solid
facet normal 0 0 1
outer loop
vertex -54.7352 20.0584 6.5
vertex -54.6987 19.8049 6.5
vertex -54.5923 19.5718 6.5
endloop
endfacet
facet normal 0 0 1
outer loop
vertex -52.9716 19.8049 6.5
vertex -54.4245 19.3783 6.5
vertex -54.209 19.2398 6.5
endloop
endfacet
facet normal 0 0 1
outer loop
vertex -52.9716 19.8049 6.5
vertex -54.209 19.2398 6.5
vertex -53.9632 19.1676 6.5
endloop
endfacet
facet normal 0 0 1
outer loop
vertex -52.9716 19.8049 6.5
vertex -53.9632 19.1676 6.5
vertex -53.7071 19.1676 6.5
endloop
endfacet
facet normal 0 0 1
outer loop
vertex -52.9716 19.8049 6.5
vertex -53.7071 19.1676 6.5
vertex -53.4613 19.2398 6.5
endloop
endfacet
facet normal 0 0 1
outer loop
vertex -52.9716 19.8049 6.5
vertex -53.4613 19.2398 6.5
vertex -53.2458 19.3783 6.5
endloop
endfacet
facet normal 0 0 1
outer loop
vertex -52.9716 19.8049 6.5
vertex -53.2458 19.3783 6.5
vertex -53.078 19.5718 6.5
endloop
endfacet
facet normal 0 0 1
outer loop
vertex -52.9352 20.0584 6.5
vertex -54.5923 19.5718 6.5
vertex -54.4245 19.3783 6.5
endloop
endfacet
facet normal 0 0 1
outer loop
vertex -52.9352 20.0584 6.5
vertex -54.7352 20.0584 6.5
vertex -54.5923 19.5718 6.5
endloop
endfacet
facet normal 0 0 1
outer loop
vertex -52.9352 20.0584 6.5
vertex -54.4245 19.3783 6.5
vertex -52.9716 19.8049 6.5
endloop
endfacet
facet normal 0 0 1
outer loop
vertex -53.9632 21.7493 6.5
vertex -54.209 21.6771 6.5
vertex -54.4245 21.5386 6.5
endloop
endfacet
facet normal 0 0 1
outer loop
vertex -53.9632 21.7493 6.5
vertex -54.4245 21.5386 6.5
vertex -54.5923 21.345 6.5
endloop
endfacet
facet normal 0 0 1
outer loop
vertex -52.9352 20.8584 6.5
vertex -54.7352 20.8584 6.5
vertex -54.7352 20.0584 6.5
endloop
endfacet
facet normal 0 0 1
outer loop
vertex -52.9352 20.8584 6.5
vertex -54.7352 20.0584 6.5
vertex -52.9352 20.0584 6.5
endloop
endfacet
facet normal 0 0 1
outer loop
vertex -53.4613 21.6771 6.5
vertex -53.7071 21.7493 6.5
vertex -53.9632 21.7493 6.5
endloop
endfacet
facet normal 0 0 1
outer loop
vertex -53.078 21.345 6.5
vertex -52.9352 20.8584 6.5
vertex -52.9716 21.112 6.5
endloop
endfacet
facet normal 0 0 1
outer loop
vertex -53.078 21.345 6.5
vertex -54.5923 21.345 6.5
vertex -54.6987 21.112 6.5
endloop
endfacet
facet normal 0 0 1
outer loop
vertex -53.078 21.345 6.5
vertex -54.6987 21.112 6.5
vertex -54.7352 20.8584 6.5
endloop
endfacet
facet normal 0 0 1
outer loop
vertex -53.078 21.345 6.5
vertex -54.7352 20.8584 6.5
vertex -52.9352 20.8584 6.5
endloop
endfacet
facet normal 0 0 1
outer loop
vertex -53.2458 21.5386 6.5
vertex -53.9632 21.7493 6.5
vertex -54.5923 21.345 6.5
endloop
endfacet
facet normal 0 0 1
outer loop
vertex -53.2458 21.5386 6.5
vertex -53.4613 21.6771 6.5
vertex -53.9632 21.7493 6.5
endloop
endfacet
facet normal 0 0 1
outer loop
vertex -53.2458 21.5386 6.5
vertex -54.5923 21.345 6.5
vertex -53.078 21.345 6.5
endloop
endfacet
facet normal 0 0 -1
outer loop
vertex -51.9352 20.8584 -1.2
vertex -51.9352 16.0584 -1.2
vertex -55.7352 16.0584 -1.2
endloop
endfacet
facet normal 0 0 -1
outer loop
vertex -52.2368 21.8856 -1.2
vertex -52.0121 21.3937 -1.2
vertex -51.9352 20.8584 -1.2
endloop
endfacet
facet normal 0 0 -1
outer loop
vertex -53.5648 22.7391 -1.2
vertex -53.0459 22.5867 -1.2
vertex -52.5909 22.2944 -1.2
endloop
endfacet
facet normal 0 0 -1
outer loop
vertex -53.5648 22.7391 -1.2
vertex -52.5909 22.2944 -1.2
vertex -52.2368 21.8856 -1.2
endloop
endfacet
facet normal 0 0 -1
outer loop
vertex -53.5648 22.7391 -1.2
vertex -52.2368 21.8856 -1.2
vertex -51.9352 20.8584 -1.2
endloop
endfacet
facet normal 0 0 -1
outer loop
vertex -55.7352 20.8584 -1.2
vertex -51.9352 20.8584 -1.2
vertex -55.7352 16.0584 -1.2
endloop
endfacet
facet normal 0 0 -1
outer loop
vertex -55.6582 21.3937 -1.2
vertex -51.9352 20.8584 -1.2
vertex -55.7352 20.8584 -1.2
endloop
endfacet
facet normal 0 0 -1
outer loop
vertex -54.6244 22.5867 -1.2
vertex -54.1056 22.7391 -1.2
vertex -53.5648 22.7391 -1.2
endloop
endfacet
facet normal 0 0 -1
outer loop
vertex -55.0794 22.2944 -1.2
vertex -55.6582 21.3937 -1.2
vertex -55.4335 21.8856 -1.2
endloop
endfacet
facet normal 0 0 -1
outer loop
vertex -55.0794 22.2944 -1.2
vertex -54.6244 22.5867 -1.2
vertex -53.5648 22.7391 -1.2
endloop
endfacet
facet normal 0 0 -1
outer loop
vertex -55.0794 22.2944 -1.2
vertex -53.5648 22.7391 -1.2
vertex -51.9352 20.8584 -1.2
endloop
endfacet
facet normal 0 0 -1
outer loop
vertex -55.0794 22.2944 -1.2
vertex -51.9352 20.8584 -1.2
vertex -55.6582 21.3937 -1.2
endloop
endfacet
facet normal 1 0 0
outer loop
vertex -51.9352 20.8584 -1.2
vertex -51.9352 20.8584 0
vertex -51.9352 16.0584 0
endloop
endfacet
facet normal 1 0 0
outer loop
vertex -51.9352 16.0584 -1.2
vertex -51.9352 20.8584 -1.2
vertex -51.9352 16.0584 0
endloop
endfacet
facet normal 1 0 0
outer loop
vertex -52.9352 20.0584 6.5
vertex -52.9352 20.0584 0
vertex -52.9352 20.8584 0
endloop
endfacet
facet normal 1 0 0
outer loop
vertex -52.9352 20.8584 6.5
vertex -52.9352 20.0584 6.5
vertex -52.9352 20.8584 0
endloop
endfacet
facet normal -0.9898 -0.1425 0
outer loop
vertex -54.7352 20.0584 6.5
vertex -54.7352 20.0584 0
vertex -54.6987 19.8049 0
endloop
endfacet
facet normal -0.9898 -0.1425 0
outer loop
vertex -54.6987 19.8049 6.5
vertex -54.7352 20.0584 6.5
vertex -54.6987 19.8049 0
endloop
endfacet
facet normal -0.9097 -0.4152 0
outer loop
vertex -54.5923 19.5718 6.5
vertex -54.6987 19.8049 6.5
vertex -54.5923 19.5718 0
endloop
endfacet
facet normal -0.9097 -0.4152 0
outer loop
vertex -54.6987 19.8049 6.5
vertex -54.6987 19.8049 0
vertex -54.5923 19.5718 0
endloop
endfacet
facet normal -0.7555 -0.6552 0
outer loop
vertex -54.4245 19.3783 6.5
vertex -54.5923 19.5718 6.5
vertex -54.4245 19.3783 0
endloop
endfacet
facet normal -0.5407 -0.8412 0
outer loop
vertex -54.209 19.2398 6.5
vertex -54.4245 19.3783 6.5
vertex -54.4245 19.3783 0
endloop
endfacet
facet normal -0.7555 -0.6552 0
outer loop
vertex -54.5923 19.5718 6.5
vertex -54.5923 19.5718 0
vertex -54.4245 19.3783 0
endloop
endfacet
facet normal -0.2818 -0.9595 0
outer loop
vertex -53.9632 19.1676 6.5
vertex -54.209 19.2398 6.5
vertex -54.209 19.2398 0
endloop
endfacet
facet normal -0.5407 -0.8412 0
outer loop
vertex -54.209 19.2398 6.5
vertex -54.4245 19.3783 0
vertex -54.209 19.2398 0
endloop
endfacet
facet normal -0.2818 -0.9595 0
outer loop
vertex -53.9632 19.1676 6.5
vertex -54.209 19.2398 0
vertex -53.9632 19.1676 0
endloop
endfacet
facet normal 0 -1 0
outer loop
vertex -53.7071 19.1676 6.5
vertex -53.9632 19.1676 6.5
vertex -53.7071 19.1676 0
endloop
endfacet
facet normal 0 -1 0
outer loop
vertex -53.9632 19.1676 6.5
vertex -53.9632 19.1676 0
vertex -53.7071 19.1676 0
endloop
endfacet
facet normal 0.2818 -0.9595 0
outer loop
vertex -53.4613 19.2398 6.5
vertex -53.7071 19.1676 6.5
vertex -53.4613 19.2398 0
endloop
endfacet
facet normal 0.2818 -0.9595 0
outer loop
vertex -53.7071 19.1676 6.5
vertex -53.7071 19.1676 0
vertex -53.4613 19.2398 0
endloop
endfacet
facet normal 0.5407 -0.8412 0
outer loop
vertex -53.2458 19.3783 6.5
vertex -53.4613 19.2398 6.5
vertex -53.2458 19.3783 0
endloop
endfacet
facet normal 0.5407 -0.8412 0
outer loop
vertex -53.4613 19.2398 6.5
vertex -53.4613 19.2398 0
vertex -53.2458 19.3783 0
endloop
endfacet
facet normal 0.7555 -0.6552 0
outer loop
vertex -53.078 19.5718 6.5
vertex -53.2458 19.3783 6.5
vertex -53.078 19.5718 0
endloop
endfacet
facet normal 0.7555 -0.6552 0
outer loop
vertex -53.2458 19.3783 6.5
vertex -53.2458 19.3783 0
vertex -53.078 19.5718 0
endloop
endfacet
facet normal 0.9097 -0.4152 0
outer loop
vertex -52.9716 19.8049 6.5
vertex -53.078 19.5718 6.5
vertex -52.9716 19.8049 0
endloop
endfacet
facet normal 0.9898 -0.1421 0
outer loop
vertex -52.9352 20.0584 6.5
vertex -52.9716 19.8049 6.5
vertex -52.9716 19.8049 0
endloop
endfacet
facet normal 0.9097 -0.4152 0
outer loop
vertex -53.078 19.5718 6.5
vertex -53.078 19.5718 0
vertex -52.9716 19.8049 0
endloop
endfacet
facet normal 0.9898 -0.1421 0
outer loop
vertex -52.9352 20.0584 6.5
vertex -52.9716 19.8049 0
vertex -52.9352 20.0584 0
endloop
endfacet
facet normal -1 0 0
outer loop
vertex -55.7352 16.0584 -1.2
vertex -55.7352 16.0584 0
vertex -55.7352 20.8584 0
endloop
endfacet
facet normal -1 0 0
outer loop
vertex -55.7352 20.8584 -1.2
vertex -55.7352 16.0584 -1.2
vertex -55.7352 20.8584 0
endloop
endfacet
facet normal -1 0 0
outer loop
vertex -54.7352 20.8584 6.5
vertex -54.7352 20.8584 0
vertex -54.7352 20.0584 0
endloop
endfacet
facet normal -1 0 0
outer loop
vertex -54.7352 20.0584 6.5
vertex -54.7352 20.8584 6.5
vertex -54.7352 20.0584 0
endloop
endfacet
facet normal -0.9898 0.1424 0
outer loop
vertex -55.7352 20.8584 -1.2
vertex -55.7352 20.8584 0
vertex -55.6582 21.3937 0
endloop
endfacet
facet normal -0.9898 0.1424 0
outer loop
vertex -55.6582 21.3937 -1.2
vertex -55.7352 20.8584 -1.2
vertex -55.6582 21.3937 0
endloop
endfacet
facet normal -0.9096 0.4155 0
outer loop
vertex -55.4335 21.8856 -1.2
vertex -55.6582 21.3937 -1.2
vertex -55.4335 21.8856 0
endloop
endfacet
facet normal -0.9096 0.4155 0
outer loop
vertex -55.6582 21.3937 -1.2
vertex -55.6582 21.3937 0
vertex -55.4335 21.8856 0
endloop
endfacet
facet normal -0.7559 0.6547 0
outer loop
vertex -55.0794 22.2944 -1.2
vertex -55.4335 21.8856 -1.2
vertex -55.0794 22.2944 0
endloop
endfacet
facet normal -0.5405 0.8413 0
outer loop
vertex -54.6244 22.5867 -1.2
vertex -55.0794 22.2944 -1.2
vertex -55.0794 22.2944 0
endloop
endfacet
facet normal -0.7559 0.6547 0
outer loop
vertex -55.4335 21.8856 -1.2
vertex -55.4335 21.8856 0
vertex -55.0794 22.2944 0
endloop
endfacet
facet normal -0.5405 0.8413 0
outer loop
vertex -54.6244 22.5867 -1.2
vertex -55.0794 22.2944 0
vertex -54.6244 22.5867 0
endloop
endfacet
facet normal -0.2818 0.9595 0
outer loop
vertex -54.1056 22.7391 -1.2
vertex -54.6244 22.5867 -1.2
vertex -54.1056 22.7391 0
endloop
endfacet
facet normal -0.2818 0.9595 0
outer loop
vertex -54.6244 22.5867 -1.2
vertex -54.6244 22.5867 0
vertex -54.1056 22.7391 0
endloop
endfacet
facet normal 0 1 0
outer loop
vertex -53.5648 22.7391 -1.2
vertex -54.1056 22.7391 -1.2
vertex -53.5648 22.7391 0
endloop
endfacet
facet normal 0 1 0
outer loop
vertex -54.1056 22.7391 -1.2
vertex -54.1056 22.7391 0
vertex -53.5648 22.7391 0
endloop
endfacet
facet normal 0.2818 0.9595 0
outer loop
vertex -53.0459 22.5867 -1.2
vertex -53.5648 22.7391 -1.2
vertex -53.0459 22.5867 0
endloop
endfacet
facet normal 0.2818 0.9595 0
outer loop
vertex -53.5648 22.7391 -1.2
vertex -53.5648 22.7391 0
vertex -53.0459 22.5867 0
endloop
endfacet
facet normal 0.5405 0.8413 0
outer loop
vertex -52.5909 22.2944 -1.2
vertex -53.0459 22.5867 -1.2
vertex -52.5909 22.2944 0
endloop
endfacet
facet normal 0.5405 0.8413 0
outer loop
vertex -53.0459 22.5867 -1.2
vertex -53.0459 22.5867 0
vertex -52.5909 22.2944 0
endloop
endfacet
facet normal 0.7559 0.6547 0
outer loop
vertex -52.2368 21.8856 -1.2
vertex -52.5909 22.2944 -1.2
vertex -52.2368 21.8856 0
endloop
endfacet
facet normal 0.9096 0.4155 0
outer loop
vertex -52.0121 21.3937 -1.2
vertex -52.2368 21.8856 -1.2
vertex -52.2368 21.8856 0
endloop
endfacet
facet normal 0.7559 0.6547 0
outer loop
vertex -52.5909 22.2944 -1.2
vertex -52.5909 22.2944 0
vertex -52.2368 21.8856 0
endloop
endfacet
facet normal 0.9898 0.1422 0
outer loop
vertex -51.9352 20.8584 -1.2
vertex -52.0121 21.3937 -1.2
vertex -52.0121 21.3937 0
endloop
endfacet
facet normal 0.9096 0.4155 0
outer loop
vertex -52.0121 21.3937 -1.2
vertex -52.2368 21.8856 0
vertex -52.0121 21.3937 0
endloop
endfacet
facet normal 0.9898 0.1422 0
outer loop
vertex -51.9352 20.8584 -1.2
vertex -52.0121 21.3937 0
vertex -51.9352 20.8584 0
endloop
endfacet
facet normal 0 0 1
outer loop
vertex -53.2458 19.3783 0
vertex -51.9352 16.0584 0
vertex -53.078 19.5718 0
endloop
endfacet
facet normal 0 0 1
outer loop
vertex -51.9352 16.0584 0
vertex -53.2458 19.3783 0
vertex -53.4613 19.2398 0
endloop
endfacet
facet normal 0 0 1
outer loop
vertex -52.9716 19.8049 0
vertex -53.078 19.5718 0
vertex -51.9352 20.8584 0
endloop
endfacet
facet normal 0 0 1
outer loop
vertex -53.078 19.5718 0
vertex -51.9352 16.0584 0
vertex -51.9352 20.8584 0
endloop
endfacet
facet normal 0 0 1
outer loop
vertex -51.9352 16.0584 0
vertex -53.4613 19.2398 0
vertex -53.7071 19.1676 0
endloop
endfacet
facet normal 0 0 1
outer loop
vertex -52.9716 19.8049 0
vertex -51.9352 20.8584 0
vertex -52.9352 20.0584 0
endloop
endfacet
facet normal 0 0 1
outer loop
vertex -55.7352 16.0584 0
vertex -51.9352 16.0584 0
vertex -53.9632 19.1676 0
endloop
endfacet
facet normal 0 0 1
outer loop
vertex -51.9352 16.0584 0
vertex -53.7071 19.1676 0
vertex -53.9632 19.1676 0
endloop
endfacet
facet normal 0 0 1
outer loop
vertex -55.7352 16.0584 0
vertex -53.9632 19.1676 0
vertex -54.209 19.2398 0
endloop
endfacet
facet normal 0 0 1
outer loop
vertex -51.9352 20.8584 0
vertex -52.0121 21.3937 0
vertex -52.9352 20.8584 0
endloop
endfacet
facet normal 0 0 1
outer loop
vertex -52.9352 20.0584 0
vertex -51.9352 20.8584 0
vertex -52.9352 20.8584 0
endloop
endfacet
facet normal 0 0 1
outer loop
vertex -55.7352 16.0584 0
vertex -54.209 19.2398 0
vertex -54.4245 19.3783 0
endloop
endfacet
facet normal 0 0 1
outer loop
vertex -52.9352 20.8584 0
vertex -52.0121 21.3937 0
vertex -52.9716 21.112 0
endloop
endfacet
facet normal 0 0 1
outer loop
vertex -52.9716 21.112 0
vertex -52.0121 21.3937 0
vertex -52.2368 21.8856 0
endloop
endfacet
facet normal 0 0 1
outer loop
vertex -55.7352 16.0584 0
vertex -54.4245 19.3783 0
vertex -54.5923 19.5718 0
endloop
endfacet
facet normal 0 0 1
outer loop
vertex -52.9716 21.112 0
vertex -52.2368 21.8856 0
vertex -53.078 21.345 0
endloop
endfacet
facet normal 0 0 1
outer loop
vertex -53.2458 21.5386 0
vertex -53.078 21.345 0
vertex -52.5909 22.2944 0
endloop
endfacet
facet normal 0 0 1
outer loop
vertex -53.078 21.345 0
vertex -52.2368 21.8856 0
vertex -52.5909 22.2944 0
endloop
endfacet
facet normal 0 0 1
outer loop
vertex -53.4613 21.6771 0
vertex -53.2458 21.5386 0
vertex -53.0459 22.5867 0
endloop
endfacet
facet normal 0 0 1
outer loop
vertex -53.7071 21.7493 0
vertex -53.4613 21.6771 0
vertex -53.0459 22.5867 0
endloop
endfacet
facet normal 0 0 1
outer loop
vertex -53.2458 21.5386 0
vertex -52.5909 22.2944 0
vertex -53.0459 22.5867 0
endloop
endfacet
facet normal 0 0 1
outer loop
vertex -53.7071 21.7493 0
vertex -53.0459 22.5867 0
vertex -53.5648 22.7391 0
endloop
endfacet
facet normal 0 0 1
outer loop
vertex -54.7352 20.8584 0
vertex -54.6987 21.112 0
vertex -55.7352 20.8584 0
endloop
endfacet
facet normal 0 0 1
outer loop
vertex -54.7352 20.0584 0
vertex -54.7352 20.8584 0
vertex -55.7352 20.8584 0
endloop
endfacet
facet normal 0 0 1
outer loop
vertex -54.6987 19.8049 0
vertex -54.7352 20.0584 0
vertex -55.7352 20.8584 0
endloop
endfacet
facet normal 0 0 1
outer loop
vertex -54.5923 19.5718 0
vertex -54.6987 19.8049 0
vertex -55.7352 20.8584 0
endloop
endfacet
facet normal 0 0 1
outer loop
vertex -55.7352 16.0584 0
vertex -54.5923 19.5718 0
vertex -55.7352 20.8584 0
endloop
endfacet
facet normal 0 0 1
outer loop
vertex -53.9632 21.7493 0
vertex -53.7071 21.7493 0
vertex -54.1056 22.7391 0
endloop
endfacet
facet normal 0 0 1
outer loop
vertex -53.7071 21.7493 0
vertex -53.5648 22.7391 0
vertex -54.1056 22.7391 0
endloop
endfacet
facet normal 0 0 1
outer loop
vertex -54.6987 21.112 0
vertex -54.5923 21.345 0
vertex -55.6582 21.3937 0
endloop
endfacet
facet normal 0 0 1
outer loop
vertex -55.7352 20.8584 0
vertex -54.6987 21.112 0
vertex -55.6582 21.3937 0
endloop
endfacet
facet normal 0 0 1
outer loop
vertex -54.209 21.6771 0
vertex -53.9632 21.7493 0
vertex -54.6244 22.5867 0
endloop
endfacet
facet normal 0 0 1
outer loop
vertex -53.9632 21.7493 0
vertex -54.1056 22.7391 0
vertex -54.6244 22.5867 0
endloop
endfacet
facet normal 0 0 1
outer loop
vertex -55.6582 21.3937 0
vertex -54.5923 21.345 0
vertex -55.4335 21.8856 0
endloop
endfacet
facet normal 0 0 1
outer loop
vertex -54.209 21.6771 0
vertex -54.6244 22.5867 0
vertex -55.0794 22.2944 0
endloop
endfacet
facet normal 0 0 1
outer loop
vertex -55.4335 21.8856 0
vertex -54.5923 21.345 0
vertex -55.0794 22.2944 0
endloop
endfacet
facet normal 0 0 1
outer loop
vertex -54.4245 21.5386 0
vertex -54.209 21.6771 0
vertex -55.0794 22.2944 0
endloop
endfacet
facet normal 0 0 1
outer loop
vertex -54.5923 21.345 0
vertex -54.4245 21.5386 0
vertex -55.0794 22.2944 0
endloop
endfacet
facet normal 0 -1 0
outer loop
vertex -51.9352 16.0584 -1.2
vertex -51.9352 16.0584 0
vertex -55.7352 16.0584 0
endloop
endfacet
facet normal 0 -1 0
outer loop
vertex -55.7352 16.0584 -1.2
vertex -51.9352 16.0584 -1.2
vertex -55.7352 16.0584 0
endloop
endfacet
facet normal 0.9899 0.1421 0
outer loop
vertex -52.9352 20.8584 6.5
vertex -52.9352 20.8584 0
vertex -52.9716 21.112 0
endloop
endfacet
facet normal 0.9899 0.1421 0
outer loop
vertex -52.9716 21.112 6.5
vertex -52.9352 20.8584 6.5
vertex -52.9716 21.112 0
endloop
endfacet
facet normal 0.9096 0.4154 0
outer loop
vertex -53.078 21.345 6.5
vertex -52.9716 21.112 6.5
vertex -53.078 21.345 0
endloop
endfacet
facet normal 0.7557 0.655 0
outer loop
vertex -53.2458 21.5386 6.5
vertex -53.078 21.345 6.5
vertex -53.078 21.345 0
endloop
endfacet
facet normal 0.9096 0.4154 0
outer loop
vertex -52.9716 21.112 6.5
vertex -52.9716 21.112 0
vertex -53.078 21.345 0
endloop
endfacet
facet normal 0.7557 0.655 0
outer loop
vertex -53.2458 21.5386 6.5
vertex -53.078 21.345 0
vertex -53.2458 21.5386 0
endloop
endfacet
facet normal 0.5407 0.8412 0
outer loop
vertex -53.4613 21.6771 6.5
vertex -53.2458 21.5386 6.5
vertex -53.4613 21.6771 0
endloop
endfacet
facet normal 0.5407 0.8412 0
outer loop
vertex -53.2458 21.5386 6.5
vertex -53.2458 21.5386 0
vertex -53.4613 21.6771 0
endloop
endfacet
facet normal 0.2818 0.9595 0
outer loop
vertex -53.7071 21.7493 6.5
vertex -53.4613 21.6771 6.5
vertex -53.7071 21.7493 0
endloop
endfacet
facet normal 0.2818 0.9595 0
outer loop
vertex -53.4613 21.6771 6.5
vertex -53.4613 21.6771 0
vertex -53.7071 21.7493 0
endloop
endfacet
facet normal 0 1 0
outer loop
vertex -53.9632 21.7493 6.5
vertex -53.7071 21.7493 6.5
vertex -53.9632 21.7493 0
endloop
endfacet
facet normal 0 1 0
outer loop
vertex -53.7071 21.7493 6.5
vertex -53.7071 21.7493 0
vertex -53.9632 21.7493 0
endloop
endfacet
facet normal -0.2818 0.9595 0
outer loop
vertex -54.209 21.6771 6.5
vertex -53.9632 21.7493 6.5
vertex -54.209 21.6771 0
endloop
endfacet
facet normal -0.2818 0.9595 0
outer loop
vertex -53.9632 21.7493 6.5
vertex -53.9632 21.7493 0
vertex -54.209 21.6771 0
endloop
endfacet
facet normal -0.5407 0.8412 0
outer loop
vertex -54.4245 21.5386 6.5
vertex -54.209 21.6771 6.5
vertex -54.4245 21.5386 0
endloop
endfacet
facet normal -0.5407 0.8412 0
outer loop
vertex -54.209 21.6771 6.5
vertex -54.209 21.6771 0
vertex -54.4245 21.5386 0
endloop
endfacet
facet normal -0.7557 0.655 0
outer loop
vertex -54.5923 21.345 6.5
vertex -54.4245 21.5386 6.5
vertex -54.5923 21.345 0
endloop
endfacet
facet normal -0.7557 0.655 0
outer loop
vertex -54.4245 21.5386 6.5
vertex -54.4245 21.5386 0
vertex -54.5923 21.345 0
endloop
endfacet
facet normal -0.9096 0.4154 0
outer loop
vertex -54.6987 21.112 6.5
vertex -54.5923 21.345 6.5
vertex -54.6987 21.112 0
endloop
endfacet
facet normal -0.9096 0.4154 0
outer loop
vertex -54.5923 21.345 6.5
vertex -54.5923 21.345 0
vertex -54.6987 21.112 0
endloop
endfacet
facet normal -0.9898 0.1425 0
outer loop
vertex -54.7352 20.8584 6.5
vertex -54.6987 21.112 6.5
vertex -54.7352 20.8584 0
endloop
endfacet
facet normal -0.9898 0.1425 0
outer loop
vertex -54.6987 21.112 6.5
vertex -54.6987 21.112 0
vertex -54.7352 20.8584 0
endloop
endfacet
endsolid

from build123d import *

# Parameters (mm, degrees)
BOSS_EXTRUDE1_DEPTH = 6.5
BOSS_EXTRUDE2_DEPTH = 1.2


with BuildPart() as part:
    # Sketch1 → Boss-Extrude1 (new body)
    with BuildSketch(Plane.XY):
        with BuildLine():
            Line((-54.735153148, 20.85842627), (-54.735153148, 20.05842627))
            ThreePointArc((-54.735153148, 20.05842627), (-53.835153148, 19.15842627), (-52.935153148, 20.05842627))
            Line((-52.935153148, 20.05842627), (-52.935153148, 20.85842627))
            ThreePointArc((-52.935153148, 20.85842627), (-53.835153148, 21.75842627), (-54.735153148, 20.85842627))
        make_face()
    extrude(amount=BOSS_EXTRUDE1_DEPTH)

    # Sketch3 → Boss-Extrude2 (add)
    with BuildSketch(Plane(origin=(0, 0, 0), x_dir=(-1, 0, 0), z_dir=(0, 0, -1))):
        with BuildLine():
            Line((51.935153148, 20.85842627), (51.935153148, 16.05842627))
            Line((51.935153148, 16.05842627), (55.735153148, 16.05842627))
            Line((55.735153148, 16.05842627), (55.735153148, 20.85842627))
            ThreePointArc((55.735153148, 20.85842627), (53.835153148, 22.75842627), (51.935153148, 20.85842627))
        make_face()
    extrude(amount=BOSS_EXTRUDE2_DEPTH)


solid = part.part
